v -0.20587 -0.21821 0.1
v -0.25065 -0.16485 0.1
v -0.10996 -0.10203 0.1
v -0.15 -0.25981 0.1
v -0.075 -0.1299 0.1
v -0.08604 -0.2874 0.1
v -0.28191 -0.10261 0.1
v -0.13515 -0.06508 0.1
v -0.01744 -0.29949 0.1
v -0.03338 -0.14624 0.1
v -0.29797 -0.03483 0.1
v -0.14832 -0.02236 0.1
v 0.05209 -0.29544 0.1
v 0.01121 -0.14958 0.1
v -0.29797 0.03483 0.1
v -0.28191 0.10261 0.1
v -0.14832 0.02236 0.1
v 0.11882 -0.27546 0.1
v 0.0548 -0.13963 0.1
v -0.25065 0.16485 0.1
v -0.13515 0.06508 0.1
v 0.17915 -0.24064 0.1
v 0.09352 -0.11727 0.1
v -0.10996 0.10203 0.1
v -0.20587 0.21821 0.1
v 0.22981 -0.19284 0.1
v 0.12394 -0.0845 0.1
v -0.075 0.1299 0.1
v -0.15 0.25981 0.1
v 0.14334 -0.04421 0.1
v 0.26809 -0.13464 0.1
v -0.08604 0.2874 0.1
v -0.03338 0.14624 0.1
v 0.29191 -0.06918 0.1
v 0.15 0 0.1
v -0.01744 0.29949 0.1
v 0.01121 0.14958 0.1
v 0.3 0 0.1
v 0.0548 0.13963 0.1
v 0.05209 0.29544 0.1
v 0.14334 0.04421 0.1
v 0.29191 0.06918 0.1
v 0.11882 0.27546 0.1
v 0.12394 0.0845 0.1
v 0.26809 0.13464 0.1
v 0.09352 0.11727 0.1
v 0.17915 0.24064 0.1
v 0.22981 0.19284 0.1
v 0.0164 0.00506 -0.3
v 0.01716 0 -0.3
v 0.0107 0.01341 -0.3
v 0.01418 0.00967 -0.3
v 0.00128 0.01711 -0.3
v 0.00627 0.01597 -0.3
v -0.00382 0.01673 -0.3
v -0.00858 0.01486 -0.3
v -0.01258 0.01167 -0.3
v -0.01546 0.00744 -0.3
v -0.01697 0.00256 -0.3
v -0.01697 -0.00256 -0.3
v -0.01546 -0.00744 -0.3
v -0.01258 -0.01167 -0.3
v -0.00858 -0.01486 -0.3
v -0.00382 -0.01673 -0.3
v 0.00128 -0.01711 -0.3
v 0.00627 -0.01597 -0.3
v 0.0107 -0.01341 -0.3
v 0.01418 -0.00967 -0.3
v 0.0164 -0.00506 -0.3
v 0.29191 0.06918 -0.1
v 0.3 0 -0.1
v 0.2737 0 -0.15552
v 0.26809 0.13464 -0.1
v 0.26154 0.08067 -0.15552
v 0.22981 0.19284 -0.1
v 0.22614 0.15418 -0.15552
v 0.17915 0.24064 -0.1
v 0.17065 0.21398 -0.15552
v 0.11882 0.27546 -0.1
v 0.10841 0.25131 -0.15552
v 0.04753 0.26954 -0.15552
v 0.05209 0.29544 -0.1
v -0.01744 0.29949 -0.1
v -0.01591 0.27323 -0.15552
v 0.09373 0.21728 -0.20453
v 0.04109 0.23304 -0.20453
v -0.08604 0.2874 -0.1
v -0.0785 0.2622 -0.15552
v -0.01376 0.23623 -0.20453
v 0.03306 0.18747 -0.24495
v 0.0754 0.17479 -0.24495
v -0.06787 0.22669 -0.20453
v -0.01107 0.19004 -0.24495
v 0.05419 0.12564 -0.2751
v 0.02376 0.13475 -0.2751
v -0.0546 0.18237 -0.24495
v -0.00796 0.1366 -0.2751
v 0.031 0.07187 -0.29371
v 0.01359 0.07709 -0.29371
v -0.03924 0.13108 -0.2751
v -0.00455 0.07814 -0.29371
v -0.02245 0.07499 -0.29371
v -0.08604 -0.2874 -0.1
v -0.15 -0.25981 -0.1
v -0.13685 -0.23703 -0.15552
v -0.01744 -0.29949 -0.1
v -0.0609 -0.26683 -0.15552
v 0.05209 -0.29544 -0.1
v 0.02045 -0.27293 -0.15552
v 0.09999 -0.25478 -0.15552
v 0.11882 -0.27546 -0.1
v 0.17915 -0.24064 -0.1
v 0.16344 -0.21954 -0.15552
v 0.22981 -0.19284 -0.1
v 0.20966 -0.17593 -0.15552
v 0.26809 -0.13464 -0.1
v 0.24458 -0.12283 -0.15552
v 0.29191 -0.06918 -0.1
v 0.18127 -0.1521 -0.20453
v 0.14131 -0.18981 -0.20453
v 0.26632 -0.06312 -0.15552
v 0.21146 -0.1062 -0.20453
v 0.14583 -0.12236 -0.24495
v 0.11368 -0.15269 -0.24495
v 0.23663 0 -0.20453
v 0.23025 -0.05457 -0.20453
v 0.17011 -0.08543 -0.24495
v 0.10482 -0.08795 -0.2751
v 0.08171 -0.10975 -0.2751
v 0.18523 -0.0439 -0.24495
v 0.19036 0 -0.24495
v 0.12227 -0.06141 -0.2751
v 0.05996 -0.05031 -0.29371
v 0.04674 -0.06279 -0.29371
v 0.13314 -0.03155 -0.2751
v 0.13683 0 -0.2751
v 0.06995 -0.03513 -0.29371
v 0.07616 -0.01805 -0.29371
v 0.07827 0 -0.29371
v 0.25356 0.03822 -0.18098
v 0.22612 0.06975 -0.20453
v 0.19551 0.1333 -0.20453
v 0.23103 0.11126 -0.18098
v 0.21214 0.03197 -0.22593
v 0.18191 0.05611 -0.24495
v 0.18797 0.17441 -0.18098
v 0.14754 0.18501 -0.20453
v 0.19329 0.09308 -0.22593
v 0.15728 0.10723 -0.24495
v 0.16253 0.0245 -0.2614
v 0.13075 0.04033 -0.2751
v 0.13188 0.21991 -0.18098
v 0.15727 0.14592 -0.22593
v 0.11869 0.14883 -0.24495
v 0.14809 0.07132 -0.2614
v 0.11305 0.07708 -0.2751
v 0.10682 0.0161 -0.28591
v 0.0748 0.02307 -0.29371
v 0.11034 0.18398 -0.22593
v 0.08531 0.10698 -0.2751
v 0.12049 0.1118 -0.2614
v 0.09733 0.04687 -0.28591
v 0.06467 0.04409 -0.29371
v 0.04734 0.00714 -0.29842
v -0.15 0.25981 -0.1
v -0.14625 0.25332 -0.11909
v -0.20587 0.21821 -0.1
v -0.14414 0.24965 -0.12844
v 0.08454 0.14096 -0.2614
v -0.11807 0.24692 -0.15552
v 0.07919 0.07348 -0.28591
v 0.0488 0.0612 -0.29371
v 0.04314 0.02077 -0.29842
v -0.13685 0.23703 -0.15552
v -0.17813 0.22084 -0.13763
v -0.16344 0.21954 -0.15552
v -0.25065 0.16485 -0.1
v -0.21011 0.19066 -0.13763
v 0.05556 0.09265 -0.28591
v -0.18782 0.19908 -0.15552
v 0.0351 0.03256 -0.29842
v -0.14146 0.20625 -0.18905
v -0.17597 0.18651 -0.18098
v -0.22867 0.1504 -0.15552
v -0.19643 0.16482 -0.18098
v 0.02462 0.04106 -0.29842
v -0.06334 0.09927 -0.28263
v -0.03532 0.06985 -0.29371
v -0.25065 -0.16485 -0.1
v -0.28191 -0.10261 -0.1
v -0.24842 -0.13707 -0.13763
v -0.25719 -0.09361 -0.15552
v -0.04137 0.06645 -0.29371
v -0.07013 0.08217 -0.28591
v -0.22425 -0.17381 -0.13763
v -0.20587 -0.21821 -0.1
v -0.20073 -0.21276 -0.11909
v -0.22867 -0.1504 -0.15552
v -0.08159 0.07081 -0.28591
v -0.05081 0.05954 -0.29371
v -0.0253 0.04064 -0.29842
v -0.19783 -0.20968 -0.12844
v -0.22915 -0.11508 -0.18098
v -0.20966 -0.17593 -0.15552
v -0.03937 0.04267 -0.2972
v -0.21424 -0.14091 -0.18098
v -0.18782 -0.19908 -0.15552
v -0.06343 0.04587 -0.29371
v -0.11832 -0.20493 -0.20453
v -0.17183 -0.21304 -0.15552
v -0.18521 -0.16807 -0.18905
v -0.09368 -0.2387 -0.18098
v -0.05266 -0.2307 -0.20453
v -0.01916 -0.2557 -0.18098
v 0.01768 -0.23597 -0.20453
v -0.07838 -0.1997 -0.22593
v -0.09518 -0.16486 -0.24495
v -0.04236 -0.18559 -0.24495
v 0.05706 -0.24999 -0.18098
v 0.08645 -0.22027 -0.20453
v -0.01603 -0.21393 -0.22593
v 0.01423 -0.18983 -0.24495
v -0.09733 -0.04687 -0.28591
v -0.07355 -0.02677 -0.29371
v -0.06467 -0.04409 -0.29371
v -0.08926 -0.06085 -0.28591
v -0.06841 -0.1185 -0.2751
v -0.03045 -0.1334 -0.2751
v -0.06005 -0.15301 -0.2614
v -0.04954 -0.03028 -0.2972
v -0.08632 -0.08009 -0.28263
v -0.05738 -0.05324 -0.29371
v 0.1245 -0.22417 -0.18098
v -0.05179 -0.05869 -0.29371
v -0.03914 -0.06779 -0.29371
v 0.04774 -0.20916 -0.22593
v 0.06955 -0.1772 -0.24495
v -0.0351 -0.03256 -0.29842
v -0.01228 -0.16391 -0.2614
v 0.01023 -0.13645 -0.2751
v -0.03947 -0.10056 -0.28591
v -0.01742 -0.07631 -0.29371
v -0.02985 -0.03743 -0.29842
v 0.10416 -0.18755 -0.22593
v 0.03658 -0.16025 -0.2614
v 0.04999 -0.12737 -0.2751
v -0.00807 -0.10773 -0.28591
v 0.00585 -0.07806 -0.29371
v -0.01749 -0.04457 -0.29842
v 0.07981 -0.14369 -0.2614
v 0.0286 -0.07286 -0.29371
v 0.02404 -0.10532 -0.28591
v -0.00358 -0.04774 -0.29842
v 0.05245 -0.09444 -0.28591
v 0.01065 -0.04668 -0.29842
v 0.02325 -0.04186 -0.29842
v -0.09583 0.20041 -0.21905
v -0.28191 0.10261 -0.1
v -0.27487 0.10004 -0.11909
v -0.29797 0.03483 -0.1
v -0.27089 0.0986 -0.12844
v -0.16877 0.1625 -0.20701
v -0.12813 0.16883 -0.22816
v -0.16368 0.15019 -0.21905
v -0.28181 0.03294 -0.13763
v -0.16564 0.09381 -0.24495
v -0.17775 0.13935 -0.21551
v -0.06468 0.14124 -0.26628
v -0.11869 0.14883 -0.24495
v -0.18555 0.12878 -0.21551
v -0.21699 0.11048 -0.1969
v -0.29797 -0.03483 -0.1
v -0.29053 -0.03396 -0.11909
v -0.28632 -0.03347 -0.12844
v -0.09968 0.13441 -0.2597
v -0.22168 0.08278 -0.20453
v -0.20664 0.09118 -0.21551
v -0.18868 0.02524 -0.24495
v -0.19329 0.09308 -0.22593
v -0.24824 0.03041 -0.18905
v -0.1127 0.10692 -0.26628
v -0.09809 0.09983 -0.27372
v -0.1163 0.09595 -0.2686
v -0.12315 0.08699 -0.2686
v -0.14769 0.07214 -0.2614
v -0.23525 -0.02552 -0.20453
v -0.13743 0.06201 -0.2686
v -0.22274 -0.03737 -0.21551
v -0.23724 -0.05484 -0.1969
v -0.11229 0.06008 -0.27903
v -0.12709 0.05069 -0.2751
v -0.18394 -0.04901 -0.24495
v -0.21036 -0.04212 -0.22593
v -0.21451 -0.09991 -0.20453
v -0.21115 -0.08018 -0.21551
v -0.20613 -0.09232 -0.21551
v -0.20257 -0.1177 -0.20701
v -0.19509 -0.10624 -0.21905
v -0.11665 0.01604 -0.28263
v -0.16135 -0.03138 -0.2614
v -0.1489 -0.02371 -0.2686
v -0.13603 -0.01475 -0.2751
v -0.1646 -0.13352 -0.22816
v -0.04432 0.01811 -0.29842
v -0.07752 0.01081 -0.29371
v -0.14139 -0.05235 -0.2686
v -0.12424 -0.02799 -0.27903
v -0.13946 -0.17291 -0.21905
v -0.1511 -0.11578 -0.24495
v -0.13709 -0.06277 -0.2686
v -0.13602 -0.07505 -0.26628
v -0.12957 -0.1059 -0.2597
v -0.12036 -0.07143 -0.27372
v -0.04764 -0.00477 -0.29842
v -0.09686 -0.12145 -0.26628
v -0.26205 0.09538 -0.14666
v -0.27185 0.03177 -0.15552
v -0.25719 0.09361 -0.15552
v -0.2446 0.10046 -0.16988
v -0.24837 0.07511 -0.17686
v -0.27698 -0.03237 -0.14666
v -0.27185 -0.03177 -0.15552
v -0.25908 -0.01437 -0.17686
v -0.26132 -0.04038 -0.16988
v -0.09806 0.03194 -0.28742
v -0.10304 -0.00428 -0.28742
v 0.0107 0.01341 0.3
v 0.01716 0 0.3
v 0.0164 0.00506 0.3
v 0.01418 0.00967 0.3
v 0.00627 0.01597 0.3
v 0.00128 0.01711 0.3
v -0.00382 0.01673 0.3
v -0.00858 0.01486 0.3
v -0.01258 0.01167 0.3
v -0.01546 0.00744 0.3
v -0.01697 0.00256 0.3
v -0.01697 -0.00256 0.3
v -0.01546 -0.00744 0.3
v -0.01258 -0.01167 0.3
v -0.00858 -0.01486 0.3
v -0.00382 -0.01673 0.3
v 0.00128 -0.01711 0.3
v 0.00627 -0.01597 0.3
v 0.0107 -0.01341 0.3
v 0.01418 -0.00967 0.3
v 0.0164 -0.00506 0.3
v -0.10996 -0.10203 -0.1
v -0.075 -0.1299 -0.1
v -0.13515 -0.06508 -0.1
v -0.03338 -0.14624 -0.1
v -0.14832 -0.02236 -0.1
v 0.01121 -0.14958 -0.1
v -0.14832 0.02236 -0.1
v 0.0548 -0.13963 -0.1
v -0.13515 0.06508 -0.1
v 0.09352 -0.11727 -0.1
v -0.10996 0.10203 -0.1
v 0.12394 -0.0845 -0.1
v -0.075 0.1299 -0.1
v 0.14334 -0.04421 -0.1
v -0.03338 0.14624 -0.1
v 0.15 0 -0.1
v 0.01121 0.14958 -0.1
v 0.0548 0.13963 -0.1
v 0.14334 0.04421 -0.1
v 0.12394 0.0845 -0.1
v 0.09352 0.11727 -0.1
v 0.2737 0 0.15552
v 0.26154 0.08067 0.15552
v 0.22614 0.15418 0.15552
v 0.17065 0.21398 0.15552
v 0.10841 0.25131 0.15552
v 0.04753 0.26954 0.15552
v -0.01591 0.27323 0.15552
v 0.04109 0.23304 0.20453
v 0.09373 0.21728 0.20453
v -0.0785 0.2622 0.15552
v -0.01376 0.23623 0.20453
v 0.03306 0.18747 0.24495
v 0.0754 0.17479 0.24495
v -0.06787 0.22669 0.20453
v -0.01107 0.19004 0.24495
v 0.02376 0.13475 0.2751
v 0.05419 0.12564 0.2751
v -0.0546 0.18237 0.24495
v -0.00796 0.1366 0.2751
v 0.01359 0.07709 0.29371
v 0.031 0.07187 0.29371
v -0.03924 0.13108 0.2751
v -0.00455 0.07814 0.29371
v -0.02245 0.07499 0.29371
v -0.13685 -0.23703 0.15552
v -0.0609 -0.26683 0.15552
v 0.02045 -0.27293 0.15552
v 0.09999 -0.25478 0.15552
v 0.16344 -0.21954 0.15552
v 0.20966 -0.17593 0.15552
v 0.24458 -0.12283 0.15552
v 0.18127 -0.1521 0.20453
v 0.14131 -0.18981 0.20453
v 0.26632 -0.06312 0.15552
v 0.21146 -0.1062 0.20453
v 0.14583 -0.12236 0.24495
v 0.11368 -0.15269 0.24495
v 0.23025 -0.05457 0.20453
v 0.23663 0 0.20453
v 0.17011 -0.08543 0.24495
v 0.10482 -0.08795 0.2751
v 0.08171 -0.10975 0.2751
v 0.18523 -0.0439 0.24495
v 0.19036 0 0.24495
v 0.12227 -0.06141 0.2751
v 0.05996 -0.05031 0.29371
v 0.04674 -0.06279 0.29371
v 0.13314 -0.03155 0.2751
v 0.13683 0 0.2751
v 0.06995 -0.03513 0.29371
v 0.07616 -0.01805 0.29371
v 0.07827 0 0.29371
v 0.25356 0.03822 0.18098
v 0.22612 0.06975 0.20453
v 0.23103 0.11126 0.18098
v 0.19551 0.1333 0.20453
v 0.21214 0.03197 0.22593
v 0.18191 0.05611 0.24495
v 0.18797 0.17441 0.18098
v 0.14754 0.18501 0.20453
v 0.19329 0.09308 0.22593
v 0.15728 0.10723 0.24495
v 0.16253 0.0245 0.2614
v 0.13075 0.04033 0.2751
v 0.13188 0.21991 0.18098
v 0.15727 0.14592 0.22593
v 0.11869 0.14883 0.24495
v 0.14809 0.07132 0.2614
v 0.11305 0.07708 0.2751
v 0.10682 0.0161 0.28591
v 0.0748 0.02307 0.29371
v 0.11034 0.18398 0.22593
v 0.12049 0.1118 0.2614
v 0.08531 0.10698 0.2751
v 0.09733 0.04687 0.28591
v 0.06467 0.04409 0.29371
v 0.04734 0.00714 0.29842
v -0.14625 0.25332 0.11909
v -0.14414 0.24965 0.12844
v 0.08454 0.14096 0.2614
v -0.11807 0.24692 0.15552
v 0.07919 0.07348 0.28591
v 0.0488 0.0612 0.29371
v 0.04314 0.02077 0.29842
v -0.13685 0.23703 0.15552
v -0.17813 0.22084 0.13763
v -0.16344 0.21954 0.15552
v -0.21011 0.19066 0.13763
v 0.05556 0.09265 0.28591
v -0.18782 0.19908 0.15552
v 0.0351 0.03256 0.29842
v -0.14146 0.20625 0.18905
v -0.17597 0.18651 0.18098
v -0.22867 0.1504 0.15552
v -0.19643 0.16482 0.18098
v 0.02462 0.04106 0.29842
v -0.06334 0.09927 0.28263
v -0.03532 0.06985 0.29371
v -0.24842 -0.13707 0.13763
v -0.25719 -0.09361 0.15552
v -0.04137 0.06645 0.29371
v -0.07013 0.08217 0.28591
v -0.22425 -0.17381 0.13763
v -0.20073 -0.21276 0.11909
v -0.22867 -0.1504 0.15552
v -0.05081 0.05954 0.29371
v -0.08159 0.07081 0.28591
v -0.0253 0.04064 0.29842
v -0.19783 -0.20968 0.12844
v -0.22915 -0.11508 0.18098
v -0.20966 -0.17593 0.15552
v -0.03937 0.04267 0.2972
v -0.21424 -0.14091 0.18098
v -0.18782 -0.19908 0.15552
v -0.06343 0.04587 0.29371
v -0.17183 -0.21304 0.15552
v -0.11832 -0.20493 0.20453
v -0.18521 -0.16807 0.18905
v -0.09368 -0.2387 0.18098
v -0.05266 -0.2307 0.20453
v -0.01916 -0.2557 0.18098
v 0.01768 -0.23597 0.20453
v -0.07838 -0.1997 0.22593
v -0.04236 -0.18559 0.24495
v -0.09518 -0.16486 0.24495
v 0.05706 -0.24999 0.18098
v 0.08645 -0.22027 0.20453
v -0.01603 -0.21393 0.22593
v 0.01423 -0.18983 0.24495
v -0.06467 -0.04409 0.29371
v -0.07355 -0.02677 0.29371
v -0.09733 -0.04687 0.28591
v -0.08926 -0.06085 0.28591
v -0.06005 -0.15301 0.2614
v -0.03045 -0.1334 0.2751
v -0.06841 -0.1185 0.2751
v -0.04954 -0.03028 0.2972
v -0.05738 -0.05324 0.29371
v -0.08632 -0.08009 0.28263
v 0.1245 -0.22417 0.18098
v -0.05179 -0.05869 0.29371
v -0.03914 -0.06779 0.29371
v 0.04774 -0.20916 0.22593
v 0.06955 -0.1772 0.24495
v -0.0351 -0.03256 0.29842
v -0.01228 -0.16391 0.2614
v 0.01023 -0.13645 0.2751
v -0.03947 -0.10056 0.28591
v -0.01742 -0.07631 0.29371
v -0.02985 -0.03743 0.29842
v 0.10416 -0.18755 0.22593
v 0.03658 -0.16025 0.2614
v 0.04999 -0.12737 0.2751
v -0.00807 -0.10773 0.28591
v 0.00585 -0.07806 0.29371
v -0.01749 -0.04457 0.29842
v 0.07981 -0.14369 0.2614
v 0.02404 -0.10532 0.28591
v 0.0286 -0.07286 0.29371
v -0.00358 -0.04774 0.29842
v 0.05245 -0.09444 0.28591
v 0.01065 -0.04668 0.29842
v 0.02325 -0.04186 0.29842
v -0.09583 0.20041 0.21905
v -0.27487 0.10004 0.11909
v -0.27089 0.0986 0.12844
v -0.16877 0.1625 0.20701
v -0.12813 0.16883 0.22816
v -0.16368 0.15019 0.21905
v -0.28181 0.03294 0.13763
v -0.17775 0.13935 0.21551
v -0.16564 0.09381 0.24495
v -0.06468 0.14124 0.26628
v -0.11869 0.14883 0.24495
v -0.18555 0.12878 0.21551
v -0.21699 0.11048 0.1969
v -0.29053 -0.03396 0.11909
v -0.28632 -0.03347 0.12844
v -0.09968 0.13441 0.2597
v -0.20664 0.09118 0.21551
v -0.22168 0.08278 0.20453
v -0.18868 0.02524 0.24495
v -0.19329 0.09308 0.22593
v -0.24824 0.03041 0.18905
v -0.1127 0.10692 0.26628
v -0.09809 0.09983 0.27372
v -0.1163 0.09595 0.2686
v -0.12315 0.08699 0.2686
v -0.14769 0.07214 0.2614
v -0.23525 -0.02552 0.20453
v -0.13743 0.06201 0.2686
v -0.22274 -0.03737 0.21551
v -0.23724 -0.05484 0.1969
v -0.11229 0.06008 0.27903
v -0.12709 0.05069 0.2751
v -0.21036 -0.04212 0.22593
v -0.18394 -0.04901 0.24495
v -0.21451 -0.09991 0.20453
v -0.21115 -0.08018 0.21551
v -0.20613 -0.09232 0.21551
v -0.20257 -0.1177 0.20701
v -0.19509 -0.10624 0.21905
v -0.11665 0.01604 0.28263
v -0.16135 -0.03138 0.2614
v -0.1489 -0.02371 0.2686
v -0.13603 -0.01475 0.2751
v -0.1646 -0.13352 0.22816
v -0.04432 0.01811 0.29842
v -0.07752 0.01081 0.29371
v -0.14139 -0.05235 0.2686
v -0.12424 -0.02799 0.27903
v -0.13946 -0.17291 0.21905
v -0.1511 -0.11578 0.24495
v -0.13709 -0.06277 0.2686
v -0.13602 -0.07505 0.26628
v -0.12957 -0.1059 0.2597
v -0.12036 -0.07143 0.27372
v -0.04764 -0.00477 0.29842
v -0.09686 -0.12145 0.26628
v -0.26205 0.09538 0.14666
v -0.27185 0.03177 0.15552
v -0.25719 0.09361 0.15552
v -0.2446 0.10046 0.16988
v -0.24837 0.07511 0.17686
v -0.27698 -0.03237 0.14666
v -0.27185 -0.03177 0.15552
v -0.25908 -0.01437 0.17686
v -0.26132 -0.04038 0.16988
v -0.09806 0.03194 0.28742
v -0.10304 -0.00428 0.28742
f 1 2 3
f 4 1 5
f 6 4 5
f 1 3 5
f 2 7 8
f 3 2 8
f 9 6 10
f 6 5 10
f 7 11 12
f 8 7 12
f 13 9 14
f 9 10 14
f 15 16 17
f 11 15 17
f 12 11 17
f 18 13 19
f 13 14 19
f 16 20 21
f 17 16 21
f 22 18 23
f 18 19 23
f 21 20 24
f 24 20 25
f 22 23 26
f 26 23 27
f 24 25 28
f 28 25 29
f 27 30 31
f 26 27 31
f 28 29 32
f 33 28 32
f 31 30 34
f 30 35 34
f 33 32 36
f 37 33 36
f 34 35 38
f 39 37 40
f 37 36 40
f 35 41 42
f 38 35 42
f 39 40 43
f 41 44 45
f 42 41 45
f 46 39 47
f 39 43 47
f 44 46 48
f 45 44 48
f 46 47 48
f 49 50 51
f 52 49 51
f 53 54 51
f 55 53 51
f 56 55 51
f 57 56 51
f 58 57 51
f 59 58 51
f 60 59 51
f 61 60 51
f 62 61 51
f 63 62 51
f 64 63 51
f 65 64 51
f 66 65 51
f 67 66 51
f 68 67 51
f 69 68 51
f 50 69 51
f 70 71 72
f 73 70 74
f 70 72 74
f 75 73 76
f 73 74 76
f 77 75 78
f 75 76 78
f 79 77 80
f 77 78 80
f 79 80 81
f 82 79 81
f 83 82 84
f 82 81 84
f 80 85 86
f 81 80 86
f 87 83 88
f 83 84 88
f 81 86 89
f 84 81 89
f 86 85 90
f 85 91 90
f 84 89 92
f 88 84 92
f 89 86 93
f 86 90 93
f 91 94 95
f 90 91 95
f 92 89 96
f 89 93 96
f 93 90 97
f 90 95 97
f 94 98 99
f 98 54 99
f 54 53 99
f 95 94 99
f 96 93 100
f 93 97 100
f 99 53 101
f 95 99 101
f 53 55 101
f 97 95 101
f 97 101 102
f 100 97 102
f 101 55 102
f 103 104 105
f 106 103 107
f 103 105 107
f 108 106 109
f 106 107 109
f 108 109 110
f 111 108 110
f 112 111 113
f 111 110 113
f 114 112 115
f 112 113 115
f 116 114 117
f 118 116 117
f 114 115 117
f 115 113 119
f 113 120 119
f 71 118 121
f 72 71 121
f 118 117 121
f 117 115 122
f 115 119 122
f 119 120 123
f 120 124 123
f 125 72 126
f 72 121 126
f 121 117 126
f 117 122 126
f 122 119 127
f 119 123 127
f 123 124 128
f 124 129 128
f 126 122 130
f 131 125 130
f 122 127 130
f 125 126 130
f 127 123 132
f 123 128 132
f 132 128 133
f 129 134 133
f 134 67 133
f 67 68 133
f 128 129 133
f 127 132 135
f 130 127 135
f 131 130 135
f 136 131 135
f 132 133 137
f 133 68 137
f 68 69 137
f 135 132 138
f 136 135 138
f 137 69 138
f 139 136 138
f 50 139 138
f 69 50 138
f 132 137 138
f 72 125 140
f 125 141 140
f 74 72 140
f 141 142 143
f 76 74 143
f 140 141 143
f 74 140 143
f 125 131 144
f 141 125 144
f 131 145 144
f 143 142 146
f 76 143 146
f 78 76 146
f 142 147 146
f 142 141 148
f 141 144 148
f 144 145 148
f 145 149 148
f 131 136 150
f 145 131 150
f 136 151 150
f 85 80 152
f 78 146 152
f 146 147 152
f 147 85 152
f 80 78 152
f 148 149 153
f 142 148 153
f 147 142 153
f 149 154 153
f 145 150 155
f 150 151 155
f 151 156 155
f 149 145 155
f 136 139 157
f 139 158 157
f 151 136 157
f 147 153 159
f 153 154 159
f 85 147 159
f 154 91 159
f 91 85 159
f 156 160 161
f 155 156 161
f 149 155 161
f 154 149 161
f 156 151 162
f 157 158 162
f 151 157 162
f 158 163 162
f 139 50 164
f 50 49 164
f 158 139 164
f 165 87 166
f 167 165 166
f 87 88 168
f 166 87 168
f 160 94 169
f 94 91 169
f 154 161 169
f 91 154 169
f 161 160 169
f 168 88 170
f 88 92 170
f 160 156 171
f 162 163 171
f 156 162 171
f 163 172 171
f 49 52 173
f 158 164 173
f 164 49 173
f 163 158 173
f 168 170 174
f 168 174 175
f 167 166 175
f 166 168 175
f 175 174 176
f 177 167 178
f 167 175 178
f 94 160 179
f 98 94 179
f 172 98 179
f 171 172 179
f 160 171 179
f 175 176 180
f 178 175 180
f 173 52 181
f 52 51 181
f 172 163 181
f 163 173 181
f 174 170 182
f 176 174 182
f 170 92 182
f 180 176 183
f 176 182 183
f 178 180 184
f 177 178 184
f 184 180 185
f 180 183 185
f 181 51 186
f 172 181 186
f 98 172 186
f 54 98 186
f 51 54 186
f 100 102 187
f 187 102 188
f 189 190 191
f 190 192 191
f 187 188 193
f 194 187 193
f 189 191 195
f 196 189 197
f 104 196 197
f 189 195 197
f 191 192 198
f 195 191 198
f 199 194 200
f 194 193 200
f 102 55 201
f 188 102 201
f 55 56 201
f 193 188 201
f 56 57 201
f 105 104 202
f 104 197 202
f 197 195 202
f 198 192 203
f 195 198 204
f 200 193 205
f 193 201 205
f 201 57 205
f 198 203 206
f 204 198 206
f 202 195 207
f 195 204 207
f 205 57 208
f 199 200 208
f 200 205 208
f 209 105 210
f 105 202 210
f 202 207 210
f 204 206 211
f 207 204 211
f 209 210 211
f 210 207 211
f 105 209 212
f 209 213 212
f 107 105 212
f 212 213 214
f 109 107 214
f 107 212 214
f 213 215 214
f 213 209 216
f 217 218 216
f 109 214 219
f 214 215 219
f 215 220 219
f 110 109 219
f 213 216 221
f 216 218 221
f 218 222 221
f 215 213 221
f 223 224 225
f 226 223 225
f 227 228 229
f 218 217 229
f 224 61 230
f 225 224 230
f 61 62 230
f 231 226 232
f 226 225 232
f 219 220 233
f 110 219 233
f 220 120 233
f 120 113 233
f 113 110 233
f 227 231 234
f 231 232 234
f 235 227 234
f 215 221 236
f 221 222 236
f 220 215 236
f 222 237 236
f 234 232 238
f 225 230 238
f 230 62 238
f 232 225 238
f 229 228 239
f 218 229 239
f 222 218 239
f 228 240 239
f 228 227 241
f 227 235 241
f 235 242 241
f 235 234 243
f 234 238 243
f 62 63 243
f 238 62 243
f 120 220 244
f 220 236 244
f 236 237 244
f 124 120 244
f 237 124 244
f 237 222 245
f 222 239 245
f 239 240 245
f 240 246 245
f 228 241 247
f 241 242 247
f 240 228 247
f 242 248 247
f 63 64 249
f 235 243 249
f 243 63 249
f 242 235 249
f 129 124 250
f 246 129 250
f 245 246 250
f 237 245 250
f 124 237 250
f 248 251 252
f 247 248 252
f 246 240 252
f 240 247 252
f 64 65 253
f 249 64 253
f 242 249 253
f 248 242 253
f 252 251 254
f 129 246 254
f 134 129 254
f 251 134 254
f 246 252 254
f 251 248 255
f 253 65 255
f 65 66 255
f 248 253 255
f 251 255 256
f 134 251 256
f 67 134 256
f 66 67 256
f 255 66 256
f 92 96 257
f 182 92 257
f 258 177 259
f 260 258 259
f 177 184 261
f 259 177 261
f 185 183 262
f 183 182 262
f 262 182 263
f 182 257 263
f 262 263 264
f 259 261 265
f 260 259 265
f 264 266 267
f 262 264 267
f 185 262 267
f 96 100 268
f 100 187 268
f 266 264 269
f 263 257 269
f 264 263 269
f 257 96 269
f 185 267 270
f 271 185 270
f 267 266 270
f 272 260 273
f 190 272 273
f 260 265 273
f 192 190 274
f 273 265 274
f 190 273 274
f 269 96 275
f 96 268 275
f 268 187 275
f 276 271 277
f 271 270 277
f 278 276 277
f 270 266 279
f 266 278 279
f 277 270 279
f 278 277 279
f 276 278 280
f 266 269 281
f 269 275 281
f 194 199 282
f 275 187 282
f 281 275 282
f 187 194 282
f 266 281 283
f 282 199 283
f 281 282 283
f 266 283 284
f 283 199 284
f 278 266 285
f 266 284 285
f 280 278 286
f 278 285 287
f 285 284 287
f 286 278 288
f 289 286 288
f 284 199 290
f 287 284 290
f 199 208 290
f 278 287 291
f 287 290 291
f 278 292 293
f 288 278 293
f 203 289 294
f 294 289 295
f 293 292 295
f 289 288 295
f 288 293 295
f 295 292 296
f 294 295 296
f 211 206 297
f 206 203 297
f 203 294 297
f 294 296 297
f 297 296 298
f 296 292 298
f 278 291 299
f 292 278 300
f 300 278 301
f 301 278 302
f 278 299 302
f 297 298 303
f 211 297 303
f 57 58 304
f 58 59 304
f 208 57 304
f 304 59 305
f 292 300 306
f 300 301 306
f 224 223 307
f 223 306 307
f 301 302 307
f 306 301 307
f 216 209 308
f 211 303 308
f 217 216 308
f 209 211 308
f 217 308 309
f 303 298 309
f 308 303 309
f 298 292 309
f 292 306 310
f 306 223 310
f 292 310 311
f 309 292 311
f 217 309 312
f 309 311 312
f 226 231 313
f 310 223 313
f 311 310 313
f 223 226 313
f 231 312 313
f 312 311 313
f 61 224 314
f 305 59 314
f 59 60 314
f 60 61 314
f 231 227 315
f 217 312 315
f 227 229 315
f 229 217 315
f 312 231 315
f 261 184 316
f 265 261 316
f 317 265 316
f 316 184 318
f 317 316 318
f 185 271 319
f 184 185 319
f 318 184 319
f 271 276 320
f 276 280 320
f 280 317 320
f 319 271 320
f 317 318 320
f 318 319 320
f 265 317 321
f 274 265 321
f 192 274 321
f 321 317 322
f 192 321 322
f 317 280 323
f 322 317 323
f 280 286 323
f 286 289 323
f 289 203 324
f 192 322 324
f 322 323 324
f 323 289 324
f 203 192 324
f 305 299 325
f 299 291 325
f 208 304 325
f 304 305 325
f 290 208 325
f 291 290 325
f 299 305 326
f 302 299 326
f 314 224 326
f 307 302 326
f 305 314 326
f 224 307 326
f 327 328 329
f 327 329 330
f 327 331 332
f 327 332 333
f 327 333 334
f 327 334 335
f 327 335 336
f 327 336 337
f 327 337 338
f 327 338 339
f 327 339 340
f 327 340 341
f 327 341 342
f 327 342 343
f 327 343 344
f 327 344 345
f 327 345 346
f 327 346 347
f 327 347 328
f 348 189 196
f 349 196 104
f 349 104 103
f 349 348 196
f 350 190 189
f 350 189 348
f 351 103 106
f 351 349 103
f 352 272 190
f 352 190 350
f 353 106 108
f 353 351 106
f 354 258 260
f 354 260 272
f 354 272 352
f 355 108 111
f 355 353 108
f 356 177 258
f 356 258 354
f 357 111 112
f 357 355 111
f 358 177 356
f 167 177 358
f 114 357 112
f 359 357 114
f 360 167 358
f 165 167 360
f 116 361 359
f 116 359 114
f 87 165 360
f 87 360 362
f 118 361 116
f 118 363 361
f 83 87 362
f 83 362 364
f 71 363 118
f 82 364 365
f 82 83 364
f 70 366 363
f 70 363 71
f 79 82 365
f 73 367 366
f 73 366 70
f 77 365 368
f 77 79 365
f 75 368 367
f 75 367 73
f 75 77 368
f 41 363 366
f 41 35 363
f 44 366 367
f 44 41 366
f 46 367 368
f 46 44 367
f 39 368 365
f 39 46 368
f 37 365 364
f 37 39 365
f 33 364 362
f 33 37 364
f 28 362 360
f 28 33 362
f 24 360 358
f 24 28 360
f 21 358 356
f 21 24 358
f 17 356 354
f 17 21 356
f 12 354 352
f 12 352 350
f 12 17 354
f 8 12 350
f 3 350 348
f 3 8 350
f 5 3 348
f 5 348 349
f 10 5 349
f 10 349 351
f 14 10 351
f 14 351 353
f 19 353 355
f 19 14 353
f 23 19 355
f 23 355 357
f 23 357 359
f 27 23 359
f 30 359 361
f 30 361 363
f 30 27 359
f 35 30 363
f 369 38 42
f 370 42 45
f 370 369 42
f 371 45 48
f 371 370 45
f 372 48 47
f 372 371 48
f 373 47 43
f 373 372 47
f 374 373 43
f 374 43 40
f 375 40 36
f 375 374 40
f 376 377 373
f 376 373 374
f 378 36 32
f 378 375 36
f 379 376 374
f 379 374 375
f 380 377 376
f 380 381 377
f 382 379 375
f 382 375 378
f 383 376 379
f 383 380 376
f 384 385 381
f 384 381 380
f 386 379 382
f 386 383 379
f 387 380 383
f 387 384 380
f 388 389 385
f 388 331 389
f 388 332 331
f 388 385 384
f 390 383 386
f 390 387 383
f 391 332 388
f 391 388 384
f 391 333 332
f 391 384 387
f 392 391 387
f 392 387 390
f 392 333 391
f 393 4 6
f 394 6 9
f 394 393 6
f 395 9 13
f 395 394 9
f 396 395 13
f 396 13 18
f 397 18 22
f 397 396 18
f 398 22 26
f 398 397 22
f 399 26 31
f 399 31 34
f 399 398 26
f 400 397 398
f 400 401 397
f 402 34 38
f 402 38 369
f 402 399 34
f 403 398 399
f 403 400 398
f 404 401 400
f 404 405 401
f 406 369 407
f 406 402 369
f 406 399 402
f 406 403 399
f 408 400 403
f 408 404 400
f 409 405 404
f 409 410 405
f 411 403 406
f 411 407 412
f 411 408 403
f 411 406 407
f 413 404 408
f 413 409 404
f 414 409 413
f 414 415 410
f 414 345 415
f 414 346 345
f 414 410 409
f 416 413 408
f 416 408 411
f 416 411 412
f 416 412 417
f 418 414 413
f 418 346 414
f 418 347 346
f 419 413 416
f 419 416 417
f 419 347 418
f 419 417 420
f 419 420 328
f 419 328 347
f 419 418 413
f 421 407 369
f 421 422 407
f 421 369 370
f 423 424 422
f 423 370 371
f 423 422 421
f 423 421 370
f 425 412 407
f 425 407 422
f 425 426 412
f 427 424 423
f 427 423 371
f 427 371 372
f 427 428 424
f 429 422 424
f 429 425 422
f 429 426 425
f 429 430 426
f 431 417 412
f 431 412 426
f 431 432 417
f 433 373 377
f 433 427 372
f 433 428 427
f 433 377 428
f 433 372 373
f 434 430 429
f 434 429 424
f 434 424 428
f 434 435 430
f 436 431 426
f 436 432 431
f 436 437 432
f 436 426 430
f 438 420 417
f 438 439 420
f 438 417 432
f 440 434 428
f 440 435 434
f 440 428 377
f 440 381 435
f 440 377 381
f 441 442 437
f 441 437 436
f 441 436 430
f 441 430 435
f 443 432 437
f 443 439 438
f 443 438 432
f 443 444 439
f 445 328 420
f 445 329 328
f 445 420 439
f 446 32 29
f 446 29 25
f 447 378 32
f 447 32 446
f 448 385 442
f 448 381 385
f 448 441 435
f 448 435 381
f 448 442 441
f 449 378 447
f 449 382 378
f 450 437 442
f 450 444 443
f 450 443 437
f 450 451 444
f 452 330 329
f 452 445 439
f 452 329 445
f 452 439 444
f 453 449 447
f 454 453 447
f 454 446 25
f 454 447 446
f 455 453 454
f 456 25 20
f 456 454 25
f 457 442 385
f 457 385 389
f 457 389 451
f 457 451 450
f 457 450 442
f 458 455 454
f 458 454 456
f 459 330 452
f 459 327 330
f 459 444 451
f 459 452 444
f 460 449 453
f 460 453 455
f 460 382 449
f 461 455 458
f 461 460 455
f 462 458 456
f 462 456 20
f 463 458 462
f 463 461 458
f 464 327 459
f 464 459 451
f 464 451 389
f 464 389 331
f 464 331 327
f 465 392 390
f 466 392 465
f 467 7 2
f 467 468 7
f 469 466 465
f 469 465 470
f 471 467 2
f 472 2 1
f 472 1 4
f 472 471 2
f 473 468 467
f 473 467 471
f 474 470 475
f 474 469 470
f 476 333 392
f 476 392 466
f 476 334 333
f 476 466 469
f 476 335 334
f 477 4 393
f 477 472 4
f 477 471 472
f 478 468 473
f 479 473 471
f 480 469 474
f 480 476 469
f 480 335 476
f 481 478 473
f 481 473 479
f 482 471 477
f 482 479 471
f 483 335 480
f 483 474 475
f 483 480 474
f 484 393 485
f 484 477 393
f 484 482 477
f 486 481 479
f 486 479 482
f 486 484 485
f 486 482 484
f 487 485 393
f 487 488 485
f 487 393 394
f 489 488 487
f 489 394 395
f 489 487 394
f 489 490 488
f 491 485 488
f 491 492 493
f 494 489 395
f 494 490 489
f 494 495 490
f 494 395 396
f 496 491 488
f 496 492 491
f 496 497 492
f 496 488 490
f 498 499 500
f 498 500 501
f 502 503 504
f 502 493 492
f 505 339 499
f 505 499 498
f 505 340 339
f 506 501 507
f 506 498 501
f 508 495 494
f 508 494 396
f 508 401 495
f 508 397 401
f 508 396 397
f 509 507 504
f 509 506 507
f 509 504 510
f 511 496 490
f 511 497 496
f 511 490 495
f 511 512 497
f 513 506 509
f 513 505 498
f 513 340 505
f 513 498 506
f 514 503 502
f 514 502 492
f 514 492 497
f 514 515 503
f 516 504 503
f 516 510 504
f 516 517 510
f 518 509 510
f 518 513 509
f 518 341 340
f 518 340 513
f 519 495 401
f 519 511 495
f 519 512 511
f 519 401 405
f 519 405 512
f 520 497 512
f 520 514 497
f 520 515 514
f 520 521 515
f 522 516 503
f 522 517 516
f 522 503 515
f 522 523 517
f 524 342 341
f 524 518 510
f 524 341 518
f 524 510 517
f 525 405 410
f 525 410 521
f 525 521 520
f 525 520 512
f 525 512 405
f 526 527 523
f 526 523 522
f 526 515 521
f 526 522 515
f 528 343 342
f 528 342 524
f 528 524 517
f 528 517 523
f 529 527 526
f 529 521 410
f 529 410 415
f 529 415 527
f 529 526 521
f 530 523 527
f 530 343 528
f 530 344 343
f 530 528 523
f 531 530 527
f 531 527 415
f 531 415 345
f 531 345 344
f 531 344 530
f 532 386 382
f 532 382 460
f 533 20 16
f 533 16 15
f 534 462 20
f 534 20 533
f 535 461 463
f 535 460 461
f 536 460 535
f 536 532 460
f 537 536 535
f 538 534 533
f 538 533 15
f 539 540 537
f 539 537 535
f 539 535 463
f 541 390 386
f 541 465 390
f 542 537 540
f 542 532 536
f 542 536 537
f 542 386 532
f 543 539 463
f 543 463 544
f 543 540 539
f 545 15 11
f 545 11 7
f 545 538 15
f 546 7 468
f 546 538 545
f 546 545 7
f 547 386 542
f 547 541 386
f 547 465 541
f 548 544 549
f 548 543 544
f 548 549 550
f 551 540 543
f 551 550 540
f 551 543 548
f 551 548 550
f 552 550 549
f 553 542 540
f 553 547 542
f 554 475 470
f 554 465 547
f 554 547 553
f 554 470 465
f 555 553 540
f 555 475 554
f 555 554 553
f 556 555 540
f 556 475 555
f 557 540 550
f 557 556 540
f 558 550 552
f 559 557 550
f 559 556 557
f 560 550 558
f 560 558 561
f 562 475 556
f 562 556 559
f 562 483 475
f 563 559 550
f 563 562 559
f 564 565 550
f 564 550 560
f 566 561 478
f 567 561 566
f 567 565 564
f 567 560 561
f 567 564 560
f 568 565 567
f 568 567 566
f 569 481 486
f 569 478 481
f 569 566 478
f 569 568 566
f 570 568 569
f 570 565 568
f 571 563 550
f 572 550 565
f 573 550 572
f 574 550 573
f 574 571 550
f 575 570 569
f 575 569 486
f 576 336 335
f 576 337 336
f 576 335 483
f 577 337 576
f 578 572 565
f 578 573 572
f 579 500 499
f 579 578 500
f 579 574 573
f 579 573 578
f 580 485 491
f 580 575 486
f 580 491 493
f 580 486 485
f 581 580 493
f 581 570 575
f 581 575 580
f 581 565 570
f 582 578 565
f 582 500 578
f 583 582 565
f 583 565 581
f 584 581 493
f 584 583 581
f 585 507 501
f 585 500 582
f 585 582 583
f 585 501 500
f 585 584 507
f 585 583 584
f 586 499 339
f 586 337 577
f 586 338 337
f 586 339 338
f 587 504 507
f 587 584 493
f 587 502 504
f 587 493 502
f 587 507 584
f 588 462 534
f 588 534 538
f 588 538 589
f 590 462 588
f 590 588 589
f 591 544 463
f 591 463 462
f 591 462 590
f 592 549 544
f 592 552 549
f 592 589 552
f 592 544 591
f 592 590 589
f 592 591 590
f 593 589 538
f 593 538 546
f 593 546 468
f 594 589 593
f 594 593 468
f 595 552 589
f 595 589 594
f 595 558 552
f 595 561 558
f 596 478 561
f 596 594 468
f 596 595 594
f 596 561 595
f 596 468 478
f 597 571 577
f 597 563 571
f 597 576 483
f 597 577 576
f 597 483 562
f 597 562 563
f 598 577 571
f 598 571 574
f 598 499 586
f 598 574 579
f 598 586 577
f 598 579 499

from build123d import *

# Parameters (mm, degrees)
ESBO_O1_R                = 0.15
RESSALTO_EXTRUS_O1_DEPTH = 0.1
ESBO_O2_R                = 0.3
RESSALTO_EXTRUS_O2_DEPTH = 0.2
FILETE1_R                = 0.3


with BuildPart() as part:
    # Esboço1 → Ressalto-extrusão1 (new, symmetric)
    with BuildSketch(Plane.XY):
        Circle(ESBO_O1_R)
    extrude(amount=RESSALTO_EXTRUS_O1_DEPTH, both=True)

    # Esboço2 → Ressalto-extrusão2 (add)
    with BuildSketch(Plane.XY.offset(0.1)):
        Circle(ESBO_O2_R)
    extrude(amount=RESSALTO_EXTRUS_O2_DEPTH)

    # Filete1
    # the kernel refuses this fillet: 0.3 mm, written as the material it takes off along each edge
    with BuildSketch(Plane(origin=(0, 0, 0.3), x_dir=(1, 0, 0), z_dir=(0, -1, 0))) as filete1_piece_1:
        with BuildLine():
            CenterArc((0.017157288, -0.3), FILETE1_R, 19.471220634, 70.528779366)
            Line((0.017157288, 0), (0.017157288, 0.006))
            Line((0.017157288, 0.006), (0.3, 0.006))
            Line((0.3, 0.006), (0.306, 0))
            ThreePointArc((0.306, 0), (0.306, -0.1), (0.305656854, -0.198))
            Line((0.305656854, -0.198), (0.3, -0.2))
        make_face()
    revolve(axis=Axis((0, 0, 0.3), (0, 0, 1)), mode=Mode.SUBTRACT)

    # Espelhar2: part across plane


with BuildPart() as part_1:
    add(part.part)
    add(part.part.mirror(Plane.XY))


solid = part_1.part
